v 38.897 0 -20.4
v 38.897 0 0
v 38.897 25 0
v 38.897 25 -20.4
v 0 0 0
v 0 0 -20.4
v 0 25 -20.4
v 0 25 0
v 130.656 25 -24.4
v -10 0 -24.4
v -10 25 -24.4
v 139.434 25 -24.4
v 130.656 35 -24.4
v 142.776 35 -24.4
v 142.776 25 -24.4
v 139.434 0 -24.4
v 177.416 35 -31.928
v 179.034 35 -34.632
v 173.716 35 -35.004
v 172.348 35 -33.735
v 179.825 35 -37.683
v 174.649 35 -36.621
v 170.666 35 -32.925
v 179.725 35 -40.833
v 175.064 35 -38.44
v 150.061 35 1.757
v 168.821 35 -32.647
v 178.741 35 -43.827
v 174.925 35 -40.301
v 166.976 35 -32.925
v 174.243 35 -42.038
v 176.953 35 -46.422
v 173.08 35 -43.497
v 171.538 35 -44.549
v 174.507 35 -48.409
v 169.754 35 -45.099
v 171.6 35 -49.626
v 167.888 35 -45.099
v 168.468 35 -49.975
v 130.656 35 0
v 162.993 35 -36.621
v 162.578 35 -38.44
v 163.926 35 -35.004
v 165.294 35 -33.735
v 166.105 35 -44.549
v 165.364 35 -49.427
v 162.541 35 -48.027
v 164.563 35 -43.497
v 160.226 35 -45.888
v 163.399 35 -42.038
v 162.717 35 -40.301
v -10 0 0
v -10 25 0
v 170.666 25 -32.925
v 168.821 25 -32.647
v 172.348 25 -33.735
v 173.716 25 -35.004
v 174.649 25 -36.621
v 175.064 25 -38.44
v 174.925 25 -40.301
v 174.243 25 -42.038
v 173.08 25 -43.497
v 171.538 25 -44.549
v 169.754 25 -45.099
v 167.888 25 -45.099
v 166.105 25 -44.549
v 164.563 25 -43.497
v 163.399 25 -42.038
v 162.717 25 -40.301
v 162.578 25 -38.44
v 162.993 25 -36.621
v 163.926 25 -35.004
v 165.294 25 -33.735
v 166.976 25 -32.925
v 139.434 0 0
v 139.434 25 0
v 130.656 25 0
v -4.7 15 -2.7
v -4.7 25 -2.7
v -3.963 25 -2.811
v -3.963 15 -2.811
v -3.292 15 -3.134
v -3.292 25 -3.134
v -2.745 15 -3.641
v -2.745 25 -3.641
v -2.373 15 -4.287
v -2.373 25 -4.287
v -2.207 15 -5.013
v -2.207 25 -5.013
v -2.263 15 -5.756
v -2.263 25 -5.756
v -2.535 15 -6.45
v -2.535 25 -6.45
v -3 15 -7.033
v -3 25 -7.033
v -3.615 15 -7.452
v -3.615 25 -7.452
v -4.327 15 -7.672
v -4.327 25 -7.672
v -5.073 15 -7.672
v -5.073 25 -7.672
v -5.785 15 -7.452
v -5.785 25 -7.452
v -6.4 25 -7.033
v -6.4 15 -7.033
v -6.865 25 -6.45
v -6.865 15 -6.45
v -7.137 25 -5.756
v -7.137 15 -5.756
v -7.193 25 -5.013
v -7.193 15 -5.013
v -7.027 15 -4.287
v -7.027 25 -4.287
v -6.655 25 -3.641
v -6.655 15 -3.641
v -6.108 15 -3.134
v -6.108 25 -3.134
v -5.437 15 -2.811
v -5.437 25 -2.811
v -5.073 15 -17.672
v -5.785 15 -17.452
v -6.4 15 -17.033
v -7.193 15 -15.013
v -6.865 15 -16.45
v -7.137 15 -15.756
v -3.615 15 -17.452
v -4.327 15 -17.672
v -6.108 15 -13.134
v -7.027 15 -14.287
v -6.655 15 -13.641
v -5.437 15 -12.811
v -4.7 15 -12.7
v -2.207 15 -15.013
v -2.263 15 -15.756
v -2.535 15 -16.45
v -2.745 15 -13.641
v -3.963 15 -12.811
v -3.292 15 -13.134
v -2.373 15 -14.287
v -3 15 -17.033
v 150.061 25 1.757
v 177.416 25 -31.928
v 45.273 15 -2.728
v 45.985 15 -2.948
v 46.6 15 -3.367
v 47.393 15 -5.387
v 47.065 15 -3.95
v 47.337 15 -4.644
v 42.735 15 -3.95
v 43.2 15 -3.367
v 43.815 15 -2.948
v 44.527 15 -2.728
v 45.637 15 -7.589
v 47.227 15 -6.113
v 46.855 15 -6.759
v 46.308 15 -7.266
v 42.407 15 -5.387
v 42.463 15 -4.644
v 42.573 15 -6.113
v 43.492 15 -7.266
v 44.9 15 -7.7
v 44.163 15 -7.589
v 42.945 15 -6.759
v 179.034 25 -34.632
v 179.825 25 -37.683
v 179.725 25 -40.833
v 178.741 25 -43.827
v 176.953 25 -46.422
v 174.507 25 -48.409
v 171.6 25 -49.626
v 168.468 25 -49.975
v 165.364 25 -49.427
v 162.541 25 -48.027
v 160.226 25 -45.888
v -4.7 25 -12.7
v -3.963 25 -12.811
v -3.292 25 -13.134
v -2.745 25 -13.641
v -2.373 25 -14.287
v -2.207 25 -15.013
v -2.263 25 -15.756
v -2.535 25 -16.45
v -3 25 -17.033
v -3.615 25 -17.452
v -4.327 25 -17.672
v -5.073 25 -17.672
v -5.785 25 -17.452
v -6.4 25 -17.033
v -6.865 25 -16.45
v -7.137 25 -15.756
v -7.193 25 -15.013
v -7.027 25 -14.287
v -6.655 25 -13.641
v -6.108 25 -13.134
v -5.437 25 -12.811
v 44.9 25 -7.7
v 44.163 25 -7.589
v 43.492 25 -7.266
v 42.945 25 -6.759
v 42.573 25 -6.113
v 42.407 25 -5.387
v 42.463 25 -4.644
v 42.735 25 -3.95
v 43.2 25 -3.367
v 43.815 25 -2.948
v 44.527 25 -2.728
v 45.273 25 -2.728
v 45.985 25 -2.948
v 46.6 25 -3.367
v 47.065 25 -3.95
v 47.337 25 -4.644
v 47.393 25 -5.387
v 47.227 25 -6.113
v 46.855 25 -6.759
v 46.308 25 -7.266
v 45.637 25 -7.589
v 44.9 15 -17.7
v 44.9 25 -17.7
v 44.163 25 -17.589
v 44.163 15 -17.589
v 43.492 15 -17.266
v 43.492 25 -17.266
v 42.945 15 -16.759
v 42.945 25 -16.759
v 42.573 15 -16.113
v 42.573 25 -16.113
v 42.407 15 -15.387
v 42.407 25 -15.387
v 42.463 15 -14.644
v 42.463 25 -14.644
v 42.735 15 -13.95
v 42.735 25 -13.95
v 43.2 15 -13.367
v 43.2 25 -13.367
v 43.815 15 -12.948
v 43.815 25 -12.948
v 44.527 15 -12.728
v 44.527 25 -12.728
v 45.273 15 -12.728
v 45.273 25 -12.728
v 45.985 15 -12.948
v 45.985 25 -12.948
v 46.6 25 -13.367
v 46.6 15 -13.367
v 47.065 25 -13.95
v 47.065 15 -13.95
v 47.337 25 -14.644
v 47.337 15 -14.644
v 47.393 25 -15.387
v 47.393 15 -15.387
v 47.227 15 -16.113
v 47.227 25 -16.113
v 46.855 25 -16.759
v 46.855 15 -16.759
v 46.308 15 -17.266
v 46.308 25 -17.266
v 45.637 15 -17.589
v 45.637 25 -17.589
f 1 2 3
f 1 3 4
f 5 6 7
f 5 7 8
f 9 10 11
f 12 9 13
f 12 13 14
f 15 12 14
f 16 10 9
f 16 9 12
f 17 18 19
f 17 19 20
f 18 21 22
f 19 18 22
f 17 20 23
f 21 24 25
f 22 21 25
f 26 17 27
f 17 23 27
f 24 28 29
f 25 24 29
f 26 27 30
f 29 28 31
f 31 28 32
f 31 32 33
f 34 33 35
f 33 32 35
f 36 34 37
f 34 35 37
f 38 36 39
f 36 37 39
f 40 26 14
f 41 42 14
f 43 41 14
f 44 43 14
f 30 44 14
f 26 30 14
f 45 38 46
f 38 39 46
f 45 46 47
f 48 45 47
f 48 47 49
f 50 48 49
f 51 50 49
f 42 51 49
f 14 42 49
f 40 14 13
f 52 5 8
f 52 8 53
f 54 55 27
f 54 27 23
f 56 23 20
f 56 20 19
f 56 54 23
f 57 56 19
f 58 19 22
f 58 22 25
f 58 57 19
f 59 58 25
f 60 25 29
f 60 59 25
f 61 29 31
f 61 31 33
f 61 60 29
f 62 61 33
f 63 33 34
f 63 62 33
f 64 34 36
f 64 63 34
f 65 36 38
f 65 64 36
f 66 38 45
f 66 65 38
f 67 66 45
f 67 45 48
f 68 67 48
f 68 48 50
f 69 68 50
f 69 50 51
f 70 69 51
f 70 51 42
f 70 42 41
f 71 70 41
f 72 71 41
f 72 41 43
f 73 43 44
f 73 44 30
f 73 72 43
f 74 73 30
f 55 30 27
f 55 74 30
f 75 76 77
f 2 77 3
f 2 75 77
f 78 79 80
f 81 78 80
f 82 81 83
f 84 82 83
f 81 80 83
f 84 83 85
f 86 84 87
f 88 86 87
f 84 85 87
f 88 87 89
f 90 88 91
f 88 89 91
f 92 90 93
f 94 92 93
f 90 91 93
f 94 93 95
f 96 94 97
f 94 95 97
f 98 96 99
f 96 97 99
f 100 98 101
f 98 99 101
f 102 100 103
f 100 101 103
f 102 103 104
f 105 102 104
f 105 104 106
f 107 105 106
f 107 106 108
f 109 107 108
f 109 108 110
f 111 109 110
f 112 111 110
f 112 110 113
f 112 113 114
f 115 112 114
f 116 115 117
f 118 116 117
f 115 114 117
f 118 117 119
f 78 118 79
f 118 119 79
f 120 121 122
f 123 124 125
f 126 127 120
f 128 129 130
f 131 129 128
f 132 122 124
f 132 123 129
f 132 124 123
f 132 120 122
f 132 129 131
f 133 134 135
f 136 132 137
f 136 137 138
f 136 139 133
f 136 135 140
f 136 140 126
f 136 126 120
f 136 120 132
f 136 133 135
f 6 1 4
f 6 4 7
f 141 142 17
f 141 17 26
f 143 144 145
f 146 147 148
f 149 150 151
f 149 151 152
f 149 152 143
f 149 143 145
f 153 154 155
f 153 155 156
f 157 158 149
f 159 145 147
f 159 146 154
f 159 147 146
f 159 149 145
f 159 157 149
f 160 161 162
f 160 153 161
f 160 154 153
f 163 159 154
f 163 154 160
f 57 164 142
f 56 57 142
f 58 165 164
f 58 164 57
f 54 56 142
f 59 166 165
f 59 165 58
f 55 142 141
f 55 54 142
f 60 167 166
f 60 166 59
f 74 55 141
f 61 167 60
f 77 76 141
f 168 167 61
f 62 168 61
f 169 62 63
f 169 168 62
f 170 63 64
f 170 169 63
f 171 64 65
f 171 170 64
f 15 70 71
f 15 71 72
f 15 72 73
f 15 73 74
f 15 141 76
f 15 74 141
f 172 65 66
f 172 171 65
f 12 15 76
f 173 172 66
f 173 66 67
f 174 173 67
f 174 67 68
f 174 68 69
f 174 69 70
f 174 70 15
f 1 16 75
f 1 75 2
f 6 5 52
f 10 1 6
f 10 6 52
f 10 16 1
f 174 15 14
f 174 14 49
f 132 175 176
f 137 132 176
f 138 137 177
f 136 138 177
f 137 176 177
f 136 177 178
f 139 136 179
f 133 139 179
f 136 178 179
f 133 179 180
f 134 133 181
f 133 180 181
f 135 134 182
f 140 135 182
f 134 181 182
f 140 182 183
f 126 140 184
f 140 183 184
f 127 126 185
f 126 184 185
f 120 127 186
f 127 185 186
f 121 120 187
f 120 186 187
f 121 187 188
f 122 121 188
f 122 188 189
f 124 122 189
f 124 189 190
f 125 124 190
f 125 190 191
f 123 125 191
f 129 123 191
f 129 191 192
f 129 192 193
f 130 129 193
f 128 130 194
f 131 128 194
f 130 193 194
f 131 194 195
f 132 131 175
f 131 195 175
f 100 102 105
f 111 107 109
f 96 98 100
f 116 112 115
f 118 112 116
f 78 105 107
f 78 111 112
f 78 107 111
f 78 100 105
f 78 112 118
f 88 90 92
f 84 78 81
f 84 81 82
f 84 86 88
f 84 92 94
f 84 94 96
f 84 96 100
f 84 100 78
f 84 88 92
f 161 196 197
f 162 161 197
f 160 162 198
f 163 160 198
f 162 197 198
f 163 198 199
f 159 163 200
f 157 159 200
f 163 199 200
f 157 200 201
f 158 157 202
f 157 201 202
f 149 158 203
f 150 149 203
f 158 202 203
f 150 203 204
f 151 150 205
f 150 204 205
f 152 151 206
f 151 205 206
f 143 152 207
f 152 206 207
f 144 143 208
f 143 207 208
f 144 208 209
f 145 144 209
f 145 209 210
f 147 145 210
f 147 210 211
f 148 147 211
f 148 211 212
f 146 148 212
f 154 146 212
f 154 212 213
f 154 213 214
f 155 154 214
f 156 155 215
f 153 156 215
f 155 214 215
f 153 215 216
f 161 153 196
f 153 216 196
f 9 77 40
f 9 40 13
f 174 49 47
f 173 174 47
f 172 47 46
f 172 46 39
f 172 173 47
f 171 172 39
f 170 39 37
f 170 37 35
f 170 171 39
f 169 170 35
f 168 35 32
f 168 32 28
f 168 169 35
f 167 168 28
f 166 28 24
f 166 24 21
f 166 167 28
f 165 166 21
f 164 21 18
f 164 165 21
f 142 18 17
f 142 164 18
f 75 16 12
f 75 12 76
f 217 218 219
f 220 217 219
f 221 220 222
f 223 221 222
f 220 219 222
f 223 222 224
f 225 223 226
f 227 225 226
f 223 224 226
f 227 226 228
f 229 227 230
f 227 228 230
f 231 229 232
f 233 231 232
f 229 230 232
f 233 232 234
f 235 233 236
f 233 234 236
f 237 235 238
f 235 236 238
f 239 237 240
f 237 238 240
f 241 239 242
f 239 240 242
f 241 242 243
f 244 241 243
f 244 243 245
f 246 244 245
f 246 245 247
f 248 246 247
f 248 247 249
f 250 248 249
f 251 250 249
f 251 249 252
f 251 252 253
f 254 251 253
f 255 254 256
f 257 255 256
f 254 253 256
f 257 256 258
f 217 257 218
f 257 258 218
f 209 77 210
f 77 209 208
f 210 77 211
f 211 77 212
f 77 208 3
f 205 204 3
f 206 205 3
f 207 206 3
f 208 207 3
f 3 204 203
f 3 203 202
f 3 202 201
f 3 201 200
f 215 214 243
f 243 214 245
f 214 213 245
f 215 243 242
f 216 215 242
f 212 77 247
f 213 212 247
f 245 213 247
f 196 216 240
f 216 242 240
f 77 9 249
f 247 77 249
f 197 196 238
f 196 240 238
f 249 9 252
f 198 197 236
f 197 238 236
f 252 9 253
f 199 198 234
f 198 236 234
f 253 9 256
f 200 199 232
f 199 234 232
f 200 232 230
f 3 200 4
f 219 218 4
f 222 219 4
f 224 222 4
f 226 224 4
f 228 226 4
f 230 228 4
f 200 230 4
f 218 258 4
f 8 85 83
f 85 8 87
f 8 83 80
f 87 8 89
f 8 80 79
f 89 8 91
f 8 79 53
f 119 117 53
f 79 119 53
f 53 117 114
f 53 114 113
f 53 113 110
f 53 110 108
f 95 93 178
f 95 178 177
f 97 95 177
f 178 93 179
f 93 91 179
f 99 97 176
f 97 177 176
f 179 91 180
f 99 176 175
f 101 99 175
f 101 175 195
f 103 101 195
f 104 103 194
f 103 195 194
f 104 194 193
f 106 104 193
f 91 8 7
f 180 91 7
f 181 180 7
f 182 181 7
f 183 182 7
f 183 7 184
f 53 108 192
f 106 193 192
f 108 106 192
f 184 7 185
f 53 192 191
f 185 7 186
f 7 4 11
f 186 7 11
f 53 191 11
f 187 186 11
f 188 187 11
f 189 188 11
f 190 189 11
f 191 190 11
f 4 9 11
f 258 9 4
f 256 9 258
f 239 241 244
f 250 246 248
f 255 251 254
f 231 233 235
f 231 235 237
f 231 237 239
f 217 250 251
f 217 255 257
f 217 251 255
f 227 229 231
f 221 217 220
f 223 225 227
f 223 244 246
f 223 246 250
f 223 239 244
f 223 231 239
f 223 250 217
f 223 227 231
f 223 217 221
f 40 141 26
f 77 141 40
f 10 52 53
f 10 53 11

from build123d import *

# Parameters (mm, degrees)
BOSS_EXTRUDE1_DEPTH = 25
SKETCH2_R           = 2.5
CUT_EXTRUDE2_DEPTH  = 10
SKETCH3_R           = 6.260875311
BOSS_EXTRUDE2_DEPTH = 10


with BuildPart() as part:
    # Sketch1 → Boss-Extrude1 (new body)
    with BuildSketch(Plane(origin=(0, 0, 0), x_dir=(1, 0, 0), z_dir=(0, 1, 0))):
        Polygon((0, 0), (-10, 0), (-10, 24.4), (139.433967886, 24.4), (139.433967886, 0), (38.897409925, 0), (38.897409925, 20.4), (0, 20.4), align=None)
    extrude(amount=BOSS_EXTRUDE1_DEPTH)

    # Sketch2 → Cut-Extrude2 (cut)
    with BuildSketch(Plane(origin=(0, 25, 0), x_dir=(1, 0, 0), z_dir=(0, 1, 0))):
        with Locations(Location((-4.7, 15.2, 0), (0, 0, 270))):
            Circle(SKETCH2_R)
        with Locations(Location((-4.7, 5.2, 0), (0, 0, 270))):
            Circle(SKETCH2_R)
        with Locations(Location((44.9, 5.2, 0), (0, 0, 90))):
            Circle(SKETCH2_R)
        with Locations(Location((44.9, 15.2, 0), (0, 0, 90))):
            Circle(SKETCH2_R)
    extrude(amount=-CUT_EXTRUDE2_DEPTH, mode=Mode.SUBTRACT)

    # Sketch3 → Boss-Extrude2 (add)
    with BuildSketch(Plane(origin=(0, 25, 0), x_dir=(1, 0, 0), z_dir=(0, 1, 0))):
        with BuildLine():
            Line((130.655933967, 24.4), (142.775772415, 24.4))
            Line((142.775772415, 24.4), (160.225946606, 45.887947938))
            ThreePointArc((160.225946606, 45.887947938), (175.801056072, 47.503042983), (177.416151117, 31.927933517))
            Line((177.416151117, 31.927933517), (150.060915274, -1.756995769))
            Line((150.060915274, -1.756995769), (130.655933967, 0))
            Line((130.655933967, 0), (130.655933967, 24.4))
        make_face()
        with Locations(Location((168.821048861, 38.907940727, 0), (0, 0, 270))):
            Circle(SKETCH3_R, mode=Mode.SUBTRACT)
    extrude(amount=BOSS_EXTRUDE2_DEPTH)


solid = part.part
